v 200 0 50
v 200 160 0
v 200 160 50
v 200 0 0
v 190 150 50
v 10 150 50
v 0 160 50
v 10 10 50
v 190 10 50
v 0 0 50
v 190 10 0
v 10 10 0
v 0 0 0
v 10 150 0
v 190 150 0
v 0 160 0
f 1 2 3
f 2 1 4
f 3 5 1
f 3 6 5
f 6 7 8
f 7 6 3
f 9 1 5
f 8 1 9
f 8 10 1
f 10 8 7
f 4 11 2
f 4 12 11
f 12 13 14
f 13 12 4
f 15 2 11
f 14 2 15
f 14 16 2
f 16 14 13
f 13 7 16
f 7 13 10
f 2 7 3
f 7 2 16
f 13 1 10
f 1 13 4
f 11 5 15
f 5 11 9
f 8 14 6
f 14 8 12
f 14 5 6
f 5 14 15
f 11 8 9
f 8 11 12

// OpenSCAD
difference()
{
  cube([200,160,50]);
  translate([10,10,-10]) cube([180,140,120]);
}
